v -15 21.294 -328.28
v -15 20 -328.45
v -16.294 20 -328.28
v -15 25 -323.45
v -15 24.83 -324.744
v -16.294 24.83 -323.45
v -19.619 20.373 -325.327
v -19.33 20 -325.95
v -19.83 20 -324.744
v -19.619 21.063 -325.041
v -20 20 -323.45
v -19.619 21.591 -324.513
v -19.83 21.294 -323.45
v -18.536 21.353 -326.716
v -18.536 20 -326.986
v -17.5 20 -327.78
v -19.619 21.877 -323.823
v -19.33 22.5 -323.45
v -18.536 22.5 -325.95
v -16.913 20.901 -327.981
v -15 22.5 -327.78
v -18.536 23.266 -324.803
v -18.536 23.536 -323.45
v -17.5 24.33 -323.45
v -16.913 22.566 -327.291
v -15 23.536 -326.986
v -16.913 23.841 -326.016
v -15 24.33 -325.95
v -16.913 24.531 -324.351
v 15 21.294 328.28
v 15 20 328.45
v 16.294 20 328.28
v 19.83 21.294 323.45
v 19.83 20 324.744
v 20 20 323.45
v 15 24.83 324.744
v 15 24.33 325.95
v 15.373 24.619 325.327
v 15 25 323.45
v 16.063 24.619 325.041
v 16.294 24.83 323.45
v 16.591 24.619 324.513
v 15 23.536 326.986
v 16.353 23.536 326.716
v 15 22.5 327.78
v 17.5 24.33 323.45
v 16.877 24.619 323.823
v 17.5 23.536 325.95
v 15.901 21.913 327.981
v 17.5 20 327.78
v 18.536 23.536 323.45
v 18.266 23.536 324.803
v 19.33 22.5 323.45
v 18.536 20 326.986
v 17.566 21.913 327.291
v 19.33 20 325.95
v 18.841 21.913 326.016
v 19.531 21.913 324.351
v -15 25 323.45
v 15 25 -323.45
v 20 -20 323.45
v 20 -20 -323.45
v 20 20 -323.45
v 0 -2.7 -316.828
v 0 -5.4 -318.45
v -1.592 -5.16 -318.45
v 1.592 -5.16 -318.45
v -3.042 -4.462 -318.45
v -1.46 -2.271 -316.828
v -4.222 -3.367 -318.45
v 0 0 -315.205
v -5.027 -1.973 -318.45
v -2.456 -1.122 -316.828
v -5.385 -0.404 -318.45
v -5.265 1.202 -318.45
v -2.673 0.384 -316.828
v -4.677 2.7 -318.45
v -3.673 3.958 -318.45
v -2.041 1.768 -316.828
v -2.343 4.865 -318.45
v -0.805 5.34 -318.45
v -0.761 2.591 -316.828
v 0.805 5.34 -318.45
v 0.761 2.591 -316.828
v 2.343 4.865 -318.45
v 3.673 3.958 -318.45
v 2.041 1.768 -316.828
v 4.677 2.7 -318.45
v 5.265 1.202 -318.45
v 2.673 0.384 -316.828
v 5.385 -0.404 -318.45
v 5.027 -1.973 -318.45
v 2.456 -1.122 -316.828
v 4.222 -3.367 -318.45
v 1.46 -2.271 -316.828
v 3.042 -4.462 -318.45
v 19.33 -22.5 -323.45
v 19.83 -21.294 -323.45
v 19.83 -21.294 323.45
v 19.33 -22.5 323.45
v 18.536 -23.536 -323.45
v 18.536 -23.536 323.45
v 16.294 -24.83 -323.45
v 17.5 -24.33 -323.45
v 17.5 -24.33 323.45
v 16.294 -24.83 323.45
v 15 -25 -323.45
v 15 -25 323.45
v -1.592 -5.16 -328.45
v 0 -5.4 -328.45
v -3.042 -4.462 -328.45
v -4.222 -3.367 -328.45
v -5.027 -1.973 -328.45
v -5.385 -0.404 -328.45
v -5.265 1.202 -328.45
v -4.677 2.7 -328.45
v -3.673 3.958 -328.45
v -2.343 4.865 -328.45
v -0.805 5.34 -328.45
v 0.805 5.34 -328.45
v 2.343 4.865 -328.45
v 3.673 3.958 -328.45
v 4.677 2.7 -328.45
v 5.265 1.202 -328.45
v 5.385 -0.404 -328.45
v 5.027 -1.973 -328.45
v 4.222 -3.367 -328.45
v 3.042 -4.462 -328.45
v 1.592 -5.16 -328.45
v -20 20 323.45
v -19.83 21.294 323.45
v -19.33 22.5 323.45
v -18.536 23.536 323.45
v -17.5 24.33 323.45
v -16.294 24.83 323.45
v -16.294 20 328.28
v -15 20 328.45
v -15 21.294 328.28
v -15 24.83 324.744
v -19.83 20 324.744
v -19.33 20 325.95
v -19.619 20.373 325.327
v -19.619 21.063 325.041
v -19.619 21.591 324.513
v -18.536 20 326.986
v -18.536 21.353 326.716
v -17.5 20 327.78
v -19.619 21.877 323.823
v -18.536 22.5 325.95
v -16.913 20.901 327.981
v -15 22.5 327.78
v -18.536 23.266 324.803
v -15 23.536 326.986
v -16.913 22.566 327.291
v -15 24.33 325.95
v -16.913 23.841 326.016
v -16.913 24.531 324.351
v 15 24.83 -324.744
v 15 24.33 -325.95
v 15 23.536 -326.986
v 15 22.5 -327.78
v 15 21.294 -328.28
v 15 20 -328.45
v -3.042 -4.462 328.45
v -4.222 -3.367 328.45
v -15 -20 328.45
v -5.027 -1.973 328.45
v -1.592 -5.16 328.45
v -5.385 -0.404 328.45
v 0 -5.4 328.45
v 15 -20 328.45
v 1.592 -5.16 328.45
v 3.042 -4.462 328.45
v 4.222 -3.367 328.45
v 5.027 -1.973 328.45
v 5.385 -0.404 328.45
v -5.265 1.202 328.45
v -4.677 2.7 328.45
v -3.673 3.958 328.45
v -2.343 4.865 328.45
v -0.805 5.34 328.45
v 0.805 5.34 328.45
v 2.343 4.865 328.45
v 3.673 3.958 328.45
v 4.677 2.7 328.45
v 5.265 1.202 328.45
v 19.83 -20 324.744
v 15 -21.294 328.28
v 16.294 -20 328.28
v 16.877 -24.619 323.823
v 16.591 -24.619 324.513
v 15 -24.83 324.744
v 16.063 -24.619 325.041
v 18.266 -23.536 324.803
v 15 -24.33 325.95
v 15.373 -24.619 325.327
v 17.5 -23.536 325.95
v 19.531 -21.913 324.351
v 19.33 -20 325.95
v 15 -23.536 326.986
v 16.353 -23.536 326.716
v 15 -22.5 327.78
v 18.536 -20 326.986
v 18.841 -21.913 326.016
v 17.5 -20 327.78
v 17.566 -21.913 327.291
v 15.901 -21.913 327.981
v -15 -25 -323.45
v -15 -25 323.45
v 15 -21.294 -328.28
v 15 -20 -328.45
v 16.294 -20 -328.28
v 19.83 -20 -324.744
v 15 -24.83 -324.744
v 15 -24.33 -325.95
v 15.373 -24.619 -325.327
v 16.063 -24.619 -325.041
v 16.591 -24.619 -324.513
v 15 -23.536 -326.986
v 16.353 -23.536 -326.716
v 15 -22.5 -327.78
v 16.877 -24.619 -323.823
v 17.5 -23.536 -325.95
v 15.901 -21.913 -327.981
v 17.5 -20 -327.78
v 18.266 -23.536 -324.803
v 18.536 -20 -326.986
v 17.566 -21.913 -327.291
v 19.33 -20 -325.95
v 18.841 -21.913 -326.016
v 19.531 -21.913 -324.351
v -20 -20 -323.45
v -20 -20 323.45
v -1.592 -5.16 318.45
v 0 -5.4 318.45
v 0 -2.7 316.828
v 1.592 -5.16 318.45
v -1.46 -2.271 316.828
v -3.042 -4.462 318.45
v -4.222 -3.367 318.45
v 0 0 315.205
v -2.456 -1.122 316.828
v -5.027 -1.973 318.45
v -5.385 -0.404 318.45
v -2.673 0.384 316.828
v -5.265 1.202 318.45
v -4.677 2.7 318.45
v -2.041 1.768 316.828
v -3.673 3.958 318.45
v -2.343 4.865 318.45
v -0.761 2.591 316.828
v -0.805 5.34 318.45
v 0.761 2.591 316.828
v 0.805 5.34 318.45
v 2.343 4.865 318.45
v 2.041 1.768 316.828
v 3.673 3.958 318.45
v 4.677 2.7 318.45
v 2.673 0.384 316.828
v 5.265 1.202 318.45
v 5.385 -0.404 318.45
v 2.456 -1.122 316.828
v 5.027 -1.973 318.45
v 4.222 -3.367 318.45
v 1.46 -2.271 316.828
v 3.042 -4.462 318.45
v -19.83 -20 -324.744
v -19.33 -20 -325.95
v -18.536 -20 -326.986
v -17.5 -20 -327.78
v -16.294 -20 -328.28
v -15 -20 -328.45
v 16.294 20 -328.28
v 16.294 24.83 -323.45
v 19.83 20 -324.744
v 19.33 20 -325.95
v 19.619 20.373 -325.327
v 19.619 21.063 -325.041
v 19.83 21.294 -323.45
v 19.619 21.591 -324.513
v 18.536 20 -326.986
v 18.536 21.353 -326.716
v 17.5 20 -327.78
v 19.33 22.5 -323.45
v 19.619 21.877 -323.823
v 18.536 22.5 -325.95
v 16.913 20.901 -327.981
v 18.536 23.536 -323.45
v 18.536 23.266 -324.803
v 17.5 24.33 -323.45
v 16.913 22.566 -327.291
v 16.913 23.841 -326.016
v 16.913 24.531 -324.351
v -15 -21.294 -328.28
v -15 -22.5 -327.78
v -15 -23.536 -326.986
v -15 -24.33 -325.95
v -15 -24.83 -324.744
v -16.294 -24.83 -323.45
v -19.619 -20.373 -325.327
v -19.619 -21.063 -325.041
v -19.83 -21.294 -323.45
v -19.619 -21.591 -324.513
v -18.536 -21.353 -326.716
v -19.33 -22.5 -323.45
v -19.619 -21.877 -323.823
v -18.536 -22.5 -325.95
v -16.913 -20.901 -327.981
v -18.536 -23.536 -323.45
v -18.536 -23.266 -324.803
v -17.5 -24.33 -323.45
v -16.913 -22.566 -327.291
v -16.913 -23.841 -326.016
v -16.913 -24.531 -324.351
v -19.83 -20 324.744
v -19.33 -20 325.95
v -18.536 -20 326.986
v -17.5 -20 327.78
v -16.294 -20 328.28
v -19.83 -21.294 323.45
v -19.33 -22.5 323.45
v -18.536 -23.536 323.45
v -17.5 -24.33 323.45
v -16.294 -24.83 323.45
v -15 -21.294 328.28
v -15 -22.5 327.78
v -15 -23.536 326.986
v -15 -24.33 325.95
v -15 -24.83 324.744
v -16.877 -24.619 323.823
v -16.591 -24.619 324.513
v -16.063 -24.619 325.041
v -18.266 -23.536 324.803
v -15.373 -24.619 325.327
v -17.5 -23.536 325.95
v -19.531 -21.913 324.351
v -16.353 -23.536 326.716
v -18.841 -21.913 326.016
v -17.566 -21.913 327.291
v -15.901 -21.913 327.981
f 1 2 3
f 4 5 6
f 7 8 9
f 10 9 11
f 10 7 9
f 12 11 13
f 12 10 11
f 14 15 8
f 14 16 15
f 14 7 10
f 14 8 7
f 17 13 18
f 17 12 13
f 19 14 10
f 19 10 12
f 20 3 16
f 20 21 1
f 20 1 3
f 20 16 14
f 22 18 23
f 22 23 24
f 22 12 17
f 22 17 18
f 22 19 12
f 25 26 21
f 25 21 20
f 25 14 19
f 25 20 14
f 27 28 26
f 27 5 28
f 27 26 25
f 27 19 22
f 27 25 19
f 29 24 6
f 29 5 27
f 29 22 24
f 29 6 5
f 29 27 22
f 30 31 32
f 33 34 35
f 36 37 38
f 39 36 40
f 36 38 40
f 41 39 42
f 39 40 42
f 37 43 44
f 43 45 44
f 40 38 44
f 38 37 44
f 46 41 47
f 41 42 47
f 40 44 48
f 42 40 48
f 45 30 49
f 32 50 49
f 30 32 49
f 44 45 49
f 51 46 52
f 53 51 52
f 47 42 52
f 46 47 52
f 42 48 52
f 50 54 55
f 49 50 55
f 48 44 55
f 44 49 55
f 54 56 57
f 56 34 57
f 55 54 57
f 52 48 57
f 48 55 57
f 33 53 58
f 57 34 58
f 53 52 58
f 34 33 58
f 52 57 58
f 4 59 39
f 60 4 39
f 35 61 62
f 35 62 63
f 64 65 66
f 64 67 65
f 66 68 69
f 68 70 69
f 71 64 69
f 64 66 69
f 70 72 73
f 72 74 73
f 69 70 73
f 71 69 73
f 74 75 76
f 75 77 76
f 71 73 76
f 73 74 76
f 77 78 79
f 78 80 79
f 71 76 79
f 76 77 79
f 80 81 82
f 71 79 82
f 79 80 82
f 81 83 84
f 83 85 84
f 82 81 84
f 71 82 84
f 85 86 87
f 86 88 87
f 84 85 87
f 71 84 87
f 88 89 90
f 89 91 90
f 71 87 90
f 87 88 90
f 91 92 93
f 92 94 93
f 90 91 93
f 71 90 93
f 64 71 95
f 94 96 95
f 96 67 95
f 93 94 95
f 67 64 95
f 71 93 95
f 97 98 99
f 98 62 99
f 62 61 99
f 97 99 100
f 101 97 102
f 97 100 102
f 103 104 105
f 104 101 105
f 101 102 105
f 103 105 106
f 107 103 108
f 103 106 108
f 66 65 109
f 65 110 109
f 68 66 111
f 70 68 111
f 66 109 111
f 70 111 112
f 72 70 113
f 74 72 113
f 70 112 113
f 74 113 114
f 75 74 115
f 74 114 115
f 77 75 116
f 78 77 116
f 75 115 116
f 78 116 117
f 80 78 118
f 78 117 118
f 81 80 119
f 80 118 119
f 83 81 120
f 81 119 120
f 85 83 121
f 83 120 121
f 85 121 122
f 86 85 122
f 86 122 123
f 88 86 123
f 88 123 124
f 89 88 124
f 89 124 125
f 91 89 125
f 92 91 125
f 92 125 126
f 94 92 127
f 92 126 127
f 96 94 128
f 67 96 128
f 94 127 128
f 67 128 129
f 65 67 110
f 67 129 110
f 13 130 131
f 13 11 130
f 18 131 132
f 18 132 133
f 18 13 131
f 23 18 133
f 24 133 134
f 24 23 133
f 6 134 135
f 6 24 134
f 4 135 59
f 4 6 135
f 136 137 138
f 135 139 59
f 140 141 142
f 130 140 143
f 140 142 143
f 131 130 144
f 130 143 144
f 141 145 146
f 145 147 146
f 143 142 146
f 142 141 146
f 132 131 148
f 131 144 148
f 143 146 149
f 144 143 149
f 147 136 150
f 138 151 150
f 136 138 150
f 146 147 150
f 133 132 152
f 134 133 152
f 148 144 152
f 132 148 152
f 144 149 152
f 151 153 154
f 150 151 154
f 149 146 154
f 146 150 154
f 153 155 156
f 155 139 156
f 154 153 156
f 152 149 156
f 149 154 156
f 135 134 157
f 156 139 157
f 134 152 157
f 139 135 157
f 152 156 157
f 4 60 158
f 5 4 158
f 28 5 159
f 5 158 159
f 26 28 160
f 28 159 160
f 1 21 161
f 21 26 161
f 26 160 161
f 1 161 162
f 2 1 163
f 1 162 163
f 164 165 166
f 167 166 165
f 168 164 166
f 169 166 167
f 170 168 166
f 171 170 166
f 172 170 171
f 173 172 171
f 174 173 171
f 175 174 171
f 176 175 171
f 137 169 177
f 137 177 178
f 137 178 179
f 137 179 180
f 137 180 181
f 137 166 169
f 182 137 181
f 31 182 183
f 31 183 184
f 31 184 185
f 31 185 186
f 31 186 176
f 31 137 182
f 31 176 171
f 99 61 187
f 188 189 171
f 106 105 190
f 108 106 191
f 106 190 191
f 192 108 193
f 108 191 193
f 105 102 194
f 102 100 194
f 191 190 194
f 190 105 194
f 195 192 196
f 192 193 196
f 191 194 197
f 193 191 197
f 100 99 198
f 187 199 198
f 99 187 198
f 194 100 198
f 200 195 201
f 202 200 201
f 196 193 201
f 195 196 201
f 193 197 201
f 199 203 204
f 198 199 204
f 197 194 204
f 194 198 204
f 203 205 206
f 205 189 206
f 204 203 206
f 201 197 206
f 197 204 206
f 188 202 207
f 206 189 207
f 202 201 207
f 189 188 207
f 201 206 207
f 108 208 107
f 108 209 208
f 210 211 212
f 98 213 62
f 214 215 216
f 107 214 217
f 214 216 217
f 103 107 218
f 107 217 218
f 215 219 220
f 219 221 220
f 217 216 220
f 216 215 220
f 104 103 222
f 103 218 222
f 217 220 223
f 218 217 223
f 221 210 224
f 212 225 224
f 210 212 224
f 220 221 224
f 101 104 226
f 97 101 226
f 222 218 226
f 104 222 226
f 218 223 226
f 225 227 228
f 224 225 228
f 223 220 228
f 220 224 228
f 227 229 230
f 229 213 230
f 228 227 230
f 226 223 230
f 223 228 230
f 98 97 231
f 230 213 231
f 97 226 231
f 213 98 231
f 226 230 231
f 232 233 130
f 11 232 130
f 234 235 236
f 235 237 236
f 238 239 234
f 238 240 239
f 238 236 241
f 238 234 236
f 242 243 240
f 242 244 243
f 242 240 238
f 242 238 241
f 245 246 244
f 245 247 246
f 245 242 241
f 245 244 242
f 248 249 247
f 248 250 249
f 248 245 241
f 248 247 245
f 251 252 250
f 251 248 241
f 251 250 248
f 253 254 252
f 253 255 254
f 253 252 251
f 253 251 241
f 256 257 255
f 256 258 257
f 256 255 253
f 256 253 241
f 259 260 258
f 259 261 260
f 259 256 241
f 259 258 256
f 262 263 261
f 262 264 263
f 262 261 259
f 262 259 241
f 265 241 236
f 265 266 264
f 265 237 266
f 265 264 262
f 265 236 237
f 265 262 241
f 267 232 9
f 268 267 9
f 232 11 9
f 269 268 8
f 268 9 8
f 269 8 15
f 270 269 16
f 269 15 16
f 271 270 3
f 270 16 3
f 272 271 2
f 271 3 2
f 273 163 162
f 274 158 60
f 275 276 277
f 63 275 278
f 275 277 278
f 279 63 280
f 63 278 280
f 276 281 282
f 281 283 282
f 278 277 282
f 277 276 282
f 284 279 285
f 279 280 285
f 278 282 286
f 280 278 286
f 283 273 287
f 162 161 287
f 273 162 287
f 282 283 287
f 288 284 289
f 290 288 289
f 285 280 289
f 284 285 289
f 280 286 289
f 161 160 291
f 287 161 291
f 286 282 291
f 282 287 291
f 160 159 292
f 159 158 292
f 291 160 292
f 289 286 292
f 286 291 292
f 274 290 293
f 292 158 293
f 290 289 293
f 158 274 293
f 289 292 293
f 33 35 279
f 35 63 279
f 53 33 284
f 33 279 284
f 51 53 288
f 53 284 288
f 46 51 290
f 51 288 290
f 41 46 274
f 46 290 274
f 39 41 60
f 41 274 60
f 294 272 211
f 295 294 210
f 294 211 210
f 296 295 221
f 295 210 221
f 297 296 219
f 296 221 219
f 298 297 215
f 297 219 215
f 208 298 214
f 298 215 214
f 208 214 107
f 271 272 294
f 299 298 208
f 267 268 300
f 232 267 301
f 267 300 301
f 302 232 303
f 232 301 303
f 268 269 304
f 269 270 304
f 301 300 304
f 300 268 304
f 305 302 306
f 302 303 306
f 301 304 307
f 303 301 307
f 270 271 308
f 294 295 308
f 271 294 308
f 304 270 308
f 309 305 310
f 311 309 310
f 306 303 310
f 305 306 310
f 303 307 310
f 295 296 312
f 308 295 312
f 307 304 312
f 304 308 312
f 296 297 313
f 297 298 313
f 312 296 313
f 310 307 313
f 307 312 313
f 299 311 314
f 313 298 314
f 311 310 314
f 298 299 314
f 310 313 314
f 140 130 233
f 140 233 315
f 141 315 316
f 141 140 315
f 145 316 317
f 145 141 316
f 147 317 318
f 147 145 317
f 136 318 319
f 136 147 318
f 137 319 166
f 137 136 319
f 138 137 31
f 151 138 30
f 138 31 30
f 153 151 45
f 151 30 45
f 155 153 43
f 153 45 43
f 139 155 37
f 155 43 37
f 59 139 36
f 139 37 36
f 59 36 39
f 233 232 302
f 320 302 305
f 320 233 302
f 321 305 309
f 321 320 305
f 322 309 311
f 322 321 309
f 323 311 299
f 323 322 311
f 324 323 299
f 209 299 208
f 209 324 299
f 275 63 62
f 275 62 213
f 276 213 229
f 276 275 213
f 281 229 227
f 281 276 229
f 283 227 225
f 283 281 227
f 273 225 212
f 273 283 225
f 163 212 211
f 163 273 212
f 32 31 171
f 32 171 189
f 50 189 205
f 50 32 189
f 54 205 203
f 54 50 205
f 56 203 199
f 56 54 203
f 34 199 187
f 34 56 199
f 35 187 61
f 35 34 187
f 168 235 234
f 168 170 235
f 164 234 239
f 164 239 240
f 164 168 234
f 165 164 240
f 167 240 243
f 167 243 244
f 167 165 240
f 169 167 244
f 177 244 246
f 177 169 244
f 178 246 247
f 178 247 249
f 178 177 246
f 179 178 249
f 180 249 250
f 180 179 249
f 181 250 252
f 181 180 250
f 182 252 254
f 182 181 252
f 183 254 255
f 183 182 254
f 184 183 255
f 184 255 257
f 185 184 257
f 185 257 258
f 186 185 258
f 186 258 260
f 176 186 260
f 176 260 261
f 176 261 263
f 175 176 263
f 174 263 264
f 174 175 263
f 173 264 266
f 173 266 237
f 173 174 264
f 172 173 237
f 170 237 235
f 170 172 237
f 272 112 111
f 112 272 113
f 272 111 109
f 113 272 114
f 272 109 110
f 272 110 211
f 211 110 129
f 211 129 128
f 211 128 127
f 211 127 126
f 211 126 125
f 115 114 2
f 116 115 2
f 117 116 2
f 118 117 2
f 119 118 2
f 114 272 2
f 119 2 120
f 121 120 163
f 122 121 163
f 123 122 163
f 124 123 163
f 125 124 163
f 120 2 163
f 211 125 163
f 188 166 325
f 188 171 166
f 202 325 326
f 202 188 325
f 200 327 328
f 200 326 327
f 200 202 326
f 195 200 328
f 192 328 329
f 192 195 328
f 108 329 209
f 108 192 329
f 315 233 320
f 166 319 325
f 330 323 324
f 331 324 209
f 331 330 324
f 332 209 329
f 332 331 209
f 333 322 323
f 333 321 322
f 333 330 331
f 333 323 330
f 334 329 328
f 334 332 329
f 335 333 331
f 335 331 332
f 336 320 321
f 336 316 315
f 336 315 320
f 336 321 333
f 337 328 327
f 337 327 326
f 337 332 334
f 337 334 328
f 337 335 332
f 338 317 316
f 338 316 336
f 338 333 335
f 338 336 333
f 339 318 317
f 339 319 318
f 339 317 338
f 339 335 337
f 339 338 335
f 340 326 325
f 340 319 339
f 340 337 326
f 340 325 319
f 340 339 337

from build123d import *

# Parameters (mm, degrees)
CROQUIS1_W              = 40
CROQUIS1_H              = 50
SALIENTE_EXTRUIR1_DEPTH = 328.45
REDONDEO1_R             = 5


with BuildPart() as part:
    # Croquis1 → Saliente-Extruir1 (new body, symmetric)
    with BuildSketch(Plane.XY):
        Rectangle(CROQUIS1_W, CROQUIS1_H)
    extrude(amount=SALIENTE_EXTRUIR1_DEPTH, both=True)

    # Redondeo1
    redondeo1_edges = [part.edges().sort_by_distance(p)[0] for p in [
        (20, 0, 328.45),
        (0, 25, 328.45),
        (-20, 0, 328.45),
        (0, 25, -328.45),
        (20, 0, -328.45),
        (0, -25, -328.45),
        (-20, 0, -328.45),
        (-20, 25, 0),
        (20, 25, 0),
        (20, -25, 0),
        (-20, -25, 0),
        (0, -25, 328.45),
    ]]
    fillet(redondeo1_edges, radius=REDONDEO1_R)

    # Croquis3 → Taladro roscado M12x1.251 (revolve, cut)
    with BuildSketch(Plane(origin=(0, 0, 328.45), x_dir=(0, -1, 0), z_dir=(1, 0, 0))):
        Polygon((0, 0), (0, 13.244647343), (5.4, 10), (5.4, 0), align=None)
    taladro_roscado_m12x1_251 = revolve(axis=Axis((0, 0, 334.8), (0, 0, -1)), mode=Mode.SUBTRACT)

    # Simetría1: Taladro roscado M12x1.251 across plane
    add(taladro_roscado_m12x1_251.mirror(Plane.XY), mode=Mode.SUBTRACT)


solid = part.part
